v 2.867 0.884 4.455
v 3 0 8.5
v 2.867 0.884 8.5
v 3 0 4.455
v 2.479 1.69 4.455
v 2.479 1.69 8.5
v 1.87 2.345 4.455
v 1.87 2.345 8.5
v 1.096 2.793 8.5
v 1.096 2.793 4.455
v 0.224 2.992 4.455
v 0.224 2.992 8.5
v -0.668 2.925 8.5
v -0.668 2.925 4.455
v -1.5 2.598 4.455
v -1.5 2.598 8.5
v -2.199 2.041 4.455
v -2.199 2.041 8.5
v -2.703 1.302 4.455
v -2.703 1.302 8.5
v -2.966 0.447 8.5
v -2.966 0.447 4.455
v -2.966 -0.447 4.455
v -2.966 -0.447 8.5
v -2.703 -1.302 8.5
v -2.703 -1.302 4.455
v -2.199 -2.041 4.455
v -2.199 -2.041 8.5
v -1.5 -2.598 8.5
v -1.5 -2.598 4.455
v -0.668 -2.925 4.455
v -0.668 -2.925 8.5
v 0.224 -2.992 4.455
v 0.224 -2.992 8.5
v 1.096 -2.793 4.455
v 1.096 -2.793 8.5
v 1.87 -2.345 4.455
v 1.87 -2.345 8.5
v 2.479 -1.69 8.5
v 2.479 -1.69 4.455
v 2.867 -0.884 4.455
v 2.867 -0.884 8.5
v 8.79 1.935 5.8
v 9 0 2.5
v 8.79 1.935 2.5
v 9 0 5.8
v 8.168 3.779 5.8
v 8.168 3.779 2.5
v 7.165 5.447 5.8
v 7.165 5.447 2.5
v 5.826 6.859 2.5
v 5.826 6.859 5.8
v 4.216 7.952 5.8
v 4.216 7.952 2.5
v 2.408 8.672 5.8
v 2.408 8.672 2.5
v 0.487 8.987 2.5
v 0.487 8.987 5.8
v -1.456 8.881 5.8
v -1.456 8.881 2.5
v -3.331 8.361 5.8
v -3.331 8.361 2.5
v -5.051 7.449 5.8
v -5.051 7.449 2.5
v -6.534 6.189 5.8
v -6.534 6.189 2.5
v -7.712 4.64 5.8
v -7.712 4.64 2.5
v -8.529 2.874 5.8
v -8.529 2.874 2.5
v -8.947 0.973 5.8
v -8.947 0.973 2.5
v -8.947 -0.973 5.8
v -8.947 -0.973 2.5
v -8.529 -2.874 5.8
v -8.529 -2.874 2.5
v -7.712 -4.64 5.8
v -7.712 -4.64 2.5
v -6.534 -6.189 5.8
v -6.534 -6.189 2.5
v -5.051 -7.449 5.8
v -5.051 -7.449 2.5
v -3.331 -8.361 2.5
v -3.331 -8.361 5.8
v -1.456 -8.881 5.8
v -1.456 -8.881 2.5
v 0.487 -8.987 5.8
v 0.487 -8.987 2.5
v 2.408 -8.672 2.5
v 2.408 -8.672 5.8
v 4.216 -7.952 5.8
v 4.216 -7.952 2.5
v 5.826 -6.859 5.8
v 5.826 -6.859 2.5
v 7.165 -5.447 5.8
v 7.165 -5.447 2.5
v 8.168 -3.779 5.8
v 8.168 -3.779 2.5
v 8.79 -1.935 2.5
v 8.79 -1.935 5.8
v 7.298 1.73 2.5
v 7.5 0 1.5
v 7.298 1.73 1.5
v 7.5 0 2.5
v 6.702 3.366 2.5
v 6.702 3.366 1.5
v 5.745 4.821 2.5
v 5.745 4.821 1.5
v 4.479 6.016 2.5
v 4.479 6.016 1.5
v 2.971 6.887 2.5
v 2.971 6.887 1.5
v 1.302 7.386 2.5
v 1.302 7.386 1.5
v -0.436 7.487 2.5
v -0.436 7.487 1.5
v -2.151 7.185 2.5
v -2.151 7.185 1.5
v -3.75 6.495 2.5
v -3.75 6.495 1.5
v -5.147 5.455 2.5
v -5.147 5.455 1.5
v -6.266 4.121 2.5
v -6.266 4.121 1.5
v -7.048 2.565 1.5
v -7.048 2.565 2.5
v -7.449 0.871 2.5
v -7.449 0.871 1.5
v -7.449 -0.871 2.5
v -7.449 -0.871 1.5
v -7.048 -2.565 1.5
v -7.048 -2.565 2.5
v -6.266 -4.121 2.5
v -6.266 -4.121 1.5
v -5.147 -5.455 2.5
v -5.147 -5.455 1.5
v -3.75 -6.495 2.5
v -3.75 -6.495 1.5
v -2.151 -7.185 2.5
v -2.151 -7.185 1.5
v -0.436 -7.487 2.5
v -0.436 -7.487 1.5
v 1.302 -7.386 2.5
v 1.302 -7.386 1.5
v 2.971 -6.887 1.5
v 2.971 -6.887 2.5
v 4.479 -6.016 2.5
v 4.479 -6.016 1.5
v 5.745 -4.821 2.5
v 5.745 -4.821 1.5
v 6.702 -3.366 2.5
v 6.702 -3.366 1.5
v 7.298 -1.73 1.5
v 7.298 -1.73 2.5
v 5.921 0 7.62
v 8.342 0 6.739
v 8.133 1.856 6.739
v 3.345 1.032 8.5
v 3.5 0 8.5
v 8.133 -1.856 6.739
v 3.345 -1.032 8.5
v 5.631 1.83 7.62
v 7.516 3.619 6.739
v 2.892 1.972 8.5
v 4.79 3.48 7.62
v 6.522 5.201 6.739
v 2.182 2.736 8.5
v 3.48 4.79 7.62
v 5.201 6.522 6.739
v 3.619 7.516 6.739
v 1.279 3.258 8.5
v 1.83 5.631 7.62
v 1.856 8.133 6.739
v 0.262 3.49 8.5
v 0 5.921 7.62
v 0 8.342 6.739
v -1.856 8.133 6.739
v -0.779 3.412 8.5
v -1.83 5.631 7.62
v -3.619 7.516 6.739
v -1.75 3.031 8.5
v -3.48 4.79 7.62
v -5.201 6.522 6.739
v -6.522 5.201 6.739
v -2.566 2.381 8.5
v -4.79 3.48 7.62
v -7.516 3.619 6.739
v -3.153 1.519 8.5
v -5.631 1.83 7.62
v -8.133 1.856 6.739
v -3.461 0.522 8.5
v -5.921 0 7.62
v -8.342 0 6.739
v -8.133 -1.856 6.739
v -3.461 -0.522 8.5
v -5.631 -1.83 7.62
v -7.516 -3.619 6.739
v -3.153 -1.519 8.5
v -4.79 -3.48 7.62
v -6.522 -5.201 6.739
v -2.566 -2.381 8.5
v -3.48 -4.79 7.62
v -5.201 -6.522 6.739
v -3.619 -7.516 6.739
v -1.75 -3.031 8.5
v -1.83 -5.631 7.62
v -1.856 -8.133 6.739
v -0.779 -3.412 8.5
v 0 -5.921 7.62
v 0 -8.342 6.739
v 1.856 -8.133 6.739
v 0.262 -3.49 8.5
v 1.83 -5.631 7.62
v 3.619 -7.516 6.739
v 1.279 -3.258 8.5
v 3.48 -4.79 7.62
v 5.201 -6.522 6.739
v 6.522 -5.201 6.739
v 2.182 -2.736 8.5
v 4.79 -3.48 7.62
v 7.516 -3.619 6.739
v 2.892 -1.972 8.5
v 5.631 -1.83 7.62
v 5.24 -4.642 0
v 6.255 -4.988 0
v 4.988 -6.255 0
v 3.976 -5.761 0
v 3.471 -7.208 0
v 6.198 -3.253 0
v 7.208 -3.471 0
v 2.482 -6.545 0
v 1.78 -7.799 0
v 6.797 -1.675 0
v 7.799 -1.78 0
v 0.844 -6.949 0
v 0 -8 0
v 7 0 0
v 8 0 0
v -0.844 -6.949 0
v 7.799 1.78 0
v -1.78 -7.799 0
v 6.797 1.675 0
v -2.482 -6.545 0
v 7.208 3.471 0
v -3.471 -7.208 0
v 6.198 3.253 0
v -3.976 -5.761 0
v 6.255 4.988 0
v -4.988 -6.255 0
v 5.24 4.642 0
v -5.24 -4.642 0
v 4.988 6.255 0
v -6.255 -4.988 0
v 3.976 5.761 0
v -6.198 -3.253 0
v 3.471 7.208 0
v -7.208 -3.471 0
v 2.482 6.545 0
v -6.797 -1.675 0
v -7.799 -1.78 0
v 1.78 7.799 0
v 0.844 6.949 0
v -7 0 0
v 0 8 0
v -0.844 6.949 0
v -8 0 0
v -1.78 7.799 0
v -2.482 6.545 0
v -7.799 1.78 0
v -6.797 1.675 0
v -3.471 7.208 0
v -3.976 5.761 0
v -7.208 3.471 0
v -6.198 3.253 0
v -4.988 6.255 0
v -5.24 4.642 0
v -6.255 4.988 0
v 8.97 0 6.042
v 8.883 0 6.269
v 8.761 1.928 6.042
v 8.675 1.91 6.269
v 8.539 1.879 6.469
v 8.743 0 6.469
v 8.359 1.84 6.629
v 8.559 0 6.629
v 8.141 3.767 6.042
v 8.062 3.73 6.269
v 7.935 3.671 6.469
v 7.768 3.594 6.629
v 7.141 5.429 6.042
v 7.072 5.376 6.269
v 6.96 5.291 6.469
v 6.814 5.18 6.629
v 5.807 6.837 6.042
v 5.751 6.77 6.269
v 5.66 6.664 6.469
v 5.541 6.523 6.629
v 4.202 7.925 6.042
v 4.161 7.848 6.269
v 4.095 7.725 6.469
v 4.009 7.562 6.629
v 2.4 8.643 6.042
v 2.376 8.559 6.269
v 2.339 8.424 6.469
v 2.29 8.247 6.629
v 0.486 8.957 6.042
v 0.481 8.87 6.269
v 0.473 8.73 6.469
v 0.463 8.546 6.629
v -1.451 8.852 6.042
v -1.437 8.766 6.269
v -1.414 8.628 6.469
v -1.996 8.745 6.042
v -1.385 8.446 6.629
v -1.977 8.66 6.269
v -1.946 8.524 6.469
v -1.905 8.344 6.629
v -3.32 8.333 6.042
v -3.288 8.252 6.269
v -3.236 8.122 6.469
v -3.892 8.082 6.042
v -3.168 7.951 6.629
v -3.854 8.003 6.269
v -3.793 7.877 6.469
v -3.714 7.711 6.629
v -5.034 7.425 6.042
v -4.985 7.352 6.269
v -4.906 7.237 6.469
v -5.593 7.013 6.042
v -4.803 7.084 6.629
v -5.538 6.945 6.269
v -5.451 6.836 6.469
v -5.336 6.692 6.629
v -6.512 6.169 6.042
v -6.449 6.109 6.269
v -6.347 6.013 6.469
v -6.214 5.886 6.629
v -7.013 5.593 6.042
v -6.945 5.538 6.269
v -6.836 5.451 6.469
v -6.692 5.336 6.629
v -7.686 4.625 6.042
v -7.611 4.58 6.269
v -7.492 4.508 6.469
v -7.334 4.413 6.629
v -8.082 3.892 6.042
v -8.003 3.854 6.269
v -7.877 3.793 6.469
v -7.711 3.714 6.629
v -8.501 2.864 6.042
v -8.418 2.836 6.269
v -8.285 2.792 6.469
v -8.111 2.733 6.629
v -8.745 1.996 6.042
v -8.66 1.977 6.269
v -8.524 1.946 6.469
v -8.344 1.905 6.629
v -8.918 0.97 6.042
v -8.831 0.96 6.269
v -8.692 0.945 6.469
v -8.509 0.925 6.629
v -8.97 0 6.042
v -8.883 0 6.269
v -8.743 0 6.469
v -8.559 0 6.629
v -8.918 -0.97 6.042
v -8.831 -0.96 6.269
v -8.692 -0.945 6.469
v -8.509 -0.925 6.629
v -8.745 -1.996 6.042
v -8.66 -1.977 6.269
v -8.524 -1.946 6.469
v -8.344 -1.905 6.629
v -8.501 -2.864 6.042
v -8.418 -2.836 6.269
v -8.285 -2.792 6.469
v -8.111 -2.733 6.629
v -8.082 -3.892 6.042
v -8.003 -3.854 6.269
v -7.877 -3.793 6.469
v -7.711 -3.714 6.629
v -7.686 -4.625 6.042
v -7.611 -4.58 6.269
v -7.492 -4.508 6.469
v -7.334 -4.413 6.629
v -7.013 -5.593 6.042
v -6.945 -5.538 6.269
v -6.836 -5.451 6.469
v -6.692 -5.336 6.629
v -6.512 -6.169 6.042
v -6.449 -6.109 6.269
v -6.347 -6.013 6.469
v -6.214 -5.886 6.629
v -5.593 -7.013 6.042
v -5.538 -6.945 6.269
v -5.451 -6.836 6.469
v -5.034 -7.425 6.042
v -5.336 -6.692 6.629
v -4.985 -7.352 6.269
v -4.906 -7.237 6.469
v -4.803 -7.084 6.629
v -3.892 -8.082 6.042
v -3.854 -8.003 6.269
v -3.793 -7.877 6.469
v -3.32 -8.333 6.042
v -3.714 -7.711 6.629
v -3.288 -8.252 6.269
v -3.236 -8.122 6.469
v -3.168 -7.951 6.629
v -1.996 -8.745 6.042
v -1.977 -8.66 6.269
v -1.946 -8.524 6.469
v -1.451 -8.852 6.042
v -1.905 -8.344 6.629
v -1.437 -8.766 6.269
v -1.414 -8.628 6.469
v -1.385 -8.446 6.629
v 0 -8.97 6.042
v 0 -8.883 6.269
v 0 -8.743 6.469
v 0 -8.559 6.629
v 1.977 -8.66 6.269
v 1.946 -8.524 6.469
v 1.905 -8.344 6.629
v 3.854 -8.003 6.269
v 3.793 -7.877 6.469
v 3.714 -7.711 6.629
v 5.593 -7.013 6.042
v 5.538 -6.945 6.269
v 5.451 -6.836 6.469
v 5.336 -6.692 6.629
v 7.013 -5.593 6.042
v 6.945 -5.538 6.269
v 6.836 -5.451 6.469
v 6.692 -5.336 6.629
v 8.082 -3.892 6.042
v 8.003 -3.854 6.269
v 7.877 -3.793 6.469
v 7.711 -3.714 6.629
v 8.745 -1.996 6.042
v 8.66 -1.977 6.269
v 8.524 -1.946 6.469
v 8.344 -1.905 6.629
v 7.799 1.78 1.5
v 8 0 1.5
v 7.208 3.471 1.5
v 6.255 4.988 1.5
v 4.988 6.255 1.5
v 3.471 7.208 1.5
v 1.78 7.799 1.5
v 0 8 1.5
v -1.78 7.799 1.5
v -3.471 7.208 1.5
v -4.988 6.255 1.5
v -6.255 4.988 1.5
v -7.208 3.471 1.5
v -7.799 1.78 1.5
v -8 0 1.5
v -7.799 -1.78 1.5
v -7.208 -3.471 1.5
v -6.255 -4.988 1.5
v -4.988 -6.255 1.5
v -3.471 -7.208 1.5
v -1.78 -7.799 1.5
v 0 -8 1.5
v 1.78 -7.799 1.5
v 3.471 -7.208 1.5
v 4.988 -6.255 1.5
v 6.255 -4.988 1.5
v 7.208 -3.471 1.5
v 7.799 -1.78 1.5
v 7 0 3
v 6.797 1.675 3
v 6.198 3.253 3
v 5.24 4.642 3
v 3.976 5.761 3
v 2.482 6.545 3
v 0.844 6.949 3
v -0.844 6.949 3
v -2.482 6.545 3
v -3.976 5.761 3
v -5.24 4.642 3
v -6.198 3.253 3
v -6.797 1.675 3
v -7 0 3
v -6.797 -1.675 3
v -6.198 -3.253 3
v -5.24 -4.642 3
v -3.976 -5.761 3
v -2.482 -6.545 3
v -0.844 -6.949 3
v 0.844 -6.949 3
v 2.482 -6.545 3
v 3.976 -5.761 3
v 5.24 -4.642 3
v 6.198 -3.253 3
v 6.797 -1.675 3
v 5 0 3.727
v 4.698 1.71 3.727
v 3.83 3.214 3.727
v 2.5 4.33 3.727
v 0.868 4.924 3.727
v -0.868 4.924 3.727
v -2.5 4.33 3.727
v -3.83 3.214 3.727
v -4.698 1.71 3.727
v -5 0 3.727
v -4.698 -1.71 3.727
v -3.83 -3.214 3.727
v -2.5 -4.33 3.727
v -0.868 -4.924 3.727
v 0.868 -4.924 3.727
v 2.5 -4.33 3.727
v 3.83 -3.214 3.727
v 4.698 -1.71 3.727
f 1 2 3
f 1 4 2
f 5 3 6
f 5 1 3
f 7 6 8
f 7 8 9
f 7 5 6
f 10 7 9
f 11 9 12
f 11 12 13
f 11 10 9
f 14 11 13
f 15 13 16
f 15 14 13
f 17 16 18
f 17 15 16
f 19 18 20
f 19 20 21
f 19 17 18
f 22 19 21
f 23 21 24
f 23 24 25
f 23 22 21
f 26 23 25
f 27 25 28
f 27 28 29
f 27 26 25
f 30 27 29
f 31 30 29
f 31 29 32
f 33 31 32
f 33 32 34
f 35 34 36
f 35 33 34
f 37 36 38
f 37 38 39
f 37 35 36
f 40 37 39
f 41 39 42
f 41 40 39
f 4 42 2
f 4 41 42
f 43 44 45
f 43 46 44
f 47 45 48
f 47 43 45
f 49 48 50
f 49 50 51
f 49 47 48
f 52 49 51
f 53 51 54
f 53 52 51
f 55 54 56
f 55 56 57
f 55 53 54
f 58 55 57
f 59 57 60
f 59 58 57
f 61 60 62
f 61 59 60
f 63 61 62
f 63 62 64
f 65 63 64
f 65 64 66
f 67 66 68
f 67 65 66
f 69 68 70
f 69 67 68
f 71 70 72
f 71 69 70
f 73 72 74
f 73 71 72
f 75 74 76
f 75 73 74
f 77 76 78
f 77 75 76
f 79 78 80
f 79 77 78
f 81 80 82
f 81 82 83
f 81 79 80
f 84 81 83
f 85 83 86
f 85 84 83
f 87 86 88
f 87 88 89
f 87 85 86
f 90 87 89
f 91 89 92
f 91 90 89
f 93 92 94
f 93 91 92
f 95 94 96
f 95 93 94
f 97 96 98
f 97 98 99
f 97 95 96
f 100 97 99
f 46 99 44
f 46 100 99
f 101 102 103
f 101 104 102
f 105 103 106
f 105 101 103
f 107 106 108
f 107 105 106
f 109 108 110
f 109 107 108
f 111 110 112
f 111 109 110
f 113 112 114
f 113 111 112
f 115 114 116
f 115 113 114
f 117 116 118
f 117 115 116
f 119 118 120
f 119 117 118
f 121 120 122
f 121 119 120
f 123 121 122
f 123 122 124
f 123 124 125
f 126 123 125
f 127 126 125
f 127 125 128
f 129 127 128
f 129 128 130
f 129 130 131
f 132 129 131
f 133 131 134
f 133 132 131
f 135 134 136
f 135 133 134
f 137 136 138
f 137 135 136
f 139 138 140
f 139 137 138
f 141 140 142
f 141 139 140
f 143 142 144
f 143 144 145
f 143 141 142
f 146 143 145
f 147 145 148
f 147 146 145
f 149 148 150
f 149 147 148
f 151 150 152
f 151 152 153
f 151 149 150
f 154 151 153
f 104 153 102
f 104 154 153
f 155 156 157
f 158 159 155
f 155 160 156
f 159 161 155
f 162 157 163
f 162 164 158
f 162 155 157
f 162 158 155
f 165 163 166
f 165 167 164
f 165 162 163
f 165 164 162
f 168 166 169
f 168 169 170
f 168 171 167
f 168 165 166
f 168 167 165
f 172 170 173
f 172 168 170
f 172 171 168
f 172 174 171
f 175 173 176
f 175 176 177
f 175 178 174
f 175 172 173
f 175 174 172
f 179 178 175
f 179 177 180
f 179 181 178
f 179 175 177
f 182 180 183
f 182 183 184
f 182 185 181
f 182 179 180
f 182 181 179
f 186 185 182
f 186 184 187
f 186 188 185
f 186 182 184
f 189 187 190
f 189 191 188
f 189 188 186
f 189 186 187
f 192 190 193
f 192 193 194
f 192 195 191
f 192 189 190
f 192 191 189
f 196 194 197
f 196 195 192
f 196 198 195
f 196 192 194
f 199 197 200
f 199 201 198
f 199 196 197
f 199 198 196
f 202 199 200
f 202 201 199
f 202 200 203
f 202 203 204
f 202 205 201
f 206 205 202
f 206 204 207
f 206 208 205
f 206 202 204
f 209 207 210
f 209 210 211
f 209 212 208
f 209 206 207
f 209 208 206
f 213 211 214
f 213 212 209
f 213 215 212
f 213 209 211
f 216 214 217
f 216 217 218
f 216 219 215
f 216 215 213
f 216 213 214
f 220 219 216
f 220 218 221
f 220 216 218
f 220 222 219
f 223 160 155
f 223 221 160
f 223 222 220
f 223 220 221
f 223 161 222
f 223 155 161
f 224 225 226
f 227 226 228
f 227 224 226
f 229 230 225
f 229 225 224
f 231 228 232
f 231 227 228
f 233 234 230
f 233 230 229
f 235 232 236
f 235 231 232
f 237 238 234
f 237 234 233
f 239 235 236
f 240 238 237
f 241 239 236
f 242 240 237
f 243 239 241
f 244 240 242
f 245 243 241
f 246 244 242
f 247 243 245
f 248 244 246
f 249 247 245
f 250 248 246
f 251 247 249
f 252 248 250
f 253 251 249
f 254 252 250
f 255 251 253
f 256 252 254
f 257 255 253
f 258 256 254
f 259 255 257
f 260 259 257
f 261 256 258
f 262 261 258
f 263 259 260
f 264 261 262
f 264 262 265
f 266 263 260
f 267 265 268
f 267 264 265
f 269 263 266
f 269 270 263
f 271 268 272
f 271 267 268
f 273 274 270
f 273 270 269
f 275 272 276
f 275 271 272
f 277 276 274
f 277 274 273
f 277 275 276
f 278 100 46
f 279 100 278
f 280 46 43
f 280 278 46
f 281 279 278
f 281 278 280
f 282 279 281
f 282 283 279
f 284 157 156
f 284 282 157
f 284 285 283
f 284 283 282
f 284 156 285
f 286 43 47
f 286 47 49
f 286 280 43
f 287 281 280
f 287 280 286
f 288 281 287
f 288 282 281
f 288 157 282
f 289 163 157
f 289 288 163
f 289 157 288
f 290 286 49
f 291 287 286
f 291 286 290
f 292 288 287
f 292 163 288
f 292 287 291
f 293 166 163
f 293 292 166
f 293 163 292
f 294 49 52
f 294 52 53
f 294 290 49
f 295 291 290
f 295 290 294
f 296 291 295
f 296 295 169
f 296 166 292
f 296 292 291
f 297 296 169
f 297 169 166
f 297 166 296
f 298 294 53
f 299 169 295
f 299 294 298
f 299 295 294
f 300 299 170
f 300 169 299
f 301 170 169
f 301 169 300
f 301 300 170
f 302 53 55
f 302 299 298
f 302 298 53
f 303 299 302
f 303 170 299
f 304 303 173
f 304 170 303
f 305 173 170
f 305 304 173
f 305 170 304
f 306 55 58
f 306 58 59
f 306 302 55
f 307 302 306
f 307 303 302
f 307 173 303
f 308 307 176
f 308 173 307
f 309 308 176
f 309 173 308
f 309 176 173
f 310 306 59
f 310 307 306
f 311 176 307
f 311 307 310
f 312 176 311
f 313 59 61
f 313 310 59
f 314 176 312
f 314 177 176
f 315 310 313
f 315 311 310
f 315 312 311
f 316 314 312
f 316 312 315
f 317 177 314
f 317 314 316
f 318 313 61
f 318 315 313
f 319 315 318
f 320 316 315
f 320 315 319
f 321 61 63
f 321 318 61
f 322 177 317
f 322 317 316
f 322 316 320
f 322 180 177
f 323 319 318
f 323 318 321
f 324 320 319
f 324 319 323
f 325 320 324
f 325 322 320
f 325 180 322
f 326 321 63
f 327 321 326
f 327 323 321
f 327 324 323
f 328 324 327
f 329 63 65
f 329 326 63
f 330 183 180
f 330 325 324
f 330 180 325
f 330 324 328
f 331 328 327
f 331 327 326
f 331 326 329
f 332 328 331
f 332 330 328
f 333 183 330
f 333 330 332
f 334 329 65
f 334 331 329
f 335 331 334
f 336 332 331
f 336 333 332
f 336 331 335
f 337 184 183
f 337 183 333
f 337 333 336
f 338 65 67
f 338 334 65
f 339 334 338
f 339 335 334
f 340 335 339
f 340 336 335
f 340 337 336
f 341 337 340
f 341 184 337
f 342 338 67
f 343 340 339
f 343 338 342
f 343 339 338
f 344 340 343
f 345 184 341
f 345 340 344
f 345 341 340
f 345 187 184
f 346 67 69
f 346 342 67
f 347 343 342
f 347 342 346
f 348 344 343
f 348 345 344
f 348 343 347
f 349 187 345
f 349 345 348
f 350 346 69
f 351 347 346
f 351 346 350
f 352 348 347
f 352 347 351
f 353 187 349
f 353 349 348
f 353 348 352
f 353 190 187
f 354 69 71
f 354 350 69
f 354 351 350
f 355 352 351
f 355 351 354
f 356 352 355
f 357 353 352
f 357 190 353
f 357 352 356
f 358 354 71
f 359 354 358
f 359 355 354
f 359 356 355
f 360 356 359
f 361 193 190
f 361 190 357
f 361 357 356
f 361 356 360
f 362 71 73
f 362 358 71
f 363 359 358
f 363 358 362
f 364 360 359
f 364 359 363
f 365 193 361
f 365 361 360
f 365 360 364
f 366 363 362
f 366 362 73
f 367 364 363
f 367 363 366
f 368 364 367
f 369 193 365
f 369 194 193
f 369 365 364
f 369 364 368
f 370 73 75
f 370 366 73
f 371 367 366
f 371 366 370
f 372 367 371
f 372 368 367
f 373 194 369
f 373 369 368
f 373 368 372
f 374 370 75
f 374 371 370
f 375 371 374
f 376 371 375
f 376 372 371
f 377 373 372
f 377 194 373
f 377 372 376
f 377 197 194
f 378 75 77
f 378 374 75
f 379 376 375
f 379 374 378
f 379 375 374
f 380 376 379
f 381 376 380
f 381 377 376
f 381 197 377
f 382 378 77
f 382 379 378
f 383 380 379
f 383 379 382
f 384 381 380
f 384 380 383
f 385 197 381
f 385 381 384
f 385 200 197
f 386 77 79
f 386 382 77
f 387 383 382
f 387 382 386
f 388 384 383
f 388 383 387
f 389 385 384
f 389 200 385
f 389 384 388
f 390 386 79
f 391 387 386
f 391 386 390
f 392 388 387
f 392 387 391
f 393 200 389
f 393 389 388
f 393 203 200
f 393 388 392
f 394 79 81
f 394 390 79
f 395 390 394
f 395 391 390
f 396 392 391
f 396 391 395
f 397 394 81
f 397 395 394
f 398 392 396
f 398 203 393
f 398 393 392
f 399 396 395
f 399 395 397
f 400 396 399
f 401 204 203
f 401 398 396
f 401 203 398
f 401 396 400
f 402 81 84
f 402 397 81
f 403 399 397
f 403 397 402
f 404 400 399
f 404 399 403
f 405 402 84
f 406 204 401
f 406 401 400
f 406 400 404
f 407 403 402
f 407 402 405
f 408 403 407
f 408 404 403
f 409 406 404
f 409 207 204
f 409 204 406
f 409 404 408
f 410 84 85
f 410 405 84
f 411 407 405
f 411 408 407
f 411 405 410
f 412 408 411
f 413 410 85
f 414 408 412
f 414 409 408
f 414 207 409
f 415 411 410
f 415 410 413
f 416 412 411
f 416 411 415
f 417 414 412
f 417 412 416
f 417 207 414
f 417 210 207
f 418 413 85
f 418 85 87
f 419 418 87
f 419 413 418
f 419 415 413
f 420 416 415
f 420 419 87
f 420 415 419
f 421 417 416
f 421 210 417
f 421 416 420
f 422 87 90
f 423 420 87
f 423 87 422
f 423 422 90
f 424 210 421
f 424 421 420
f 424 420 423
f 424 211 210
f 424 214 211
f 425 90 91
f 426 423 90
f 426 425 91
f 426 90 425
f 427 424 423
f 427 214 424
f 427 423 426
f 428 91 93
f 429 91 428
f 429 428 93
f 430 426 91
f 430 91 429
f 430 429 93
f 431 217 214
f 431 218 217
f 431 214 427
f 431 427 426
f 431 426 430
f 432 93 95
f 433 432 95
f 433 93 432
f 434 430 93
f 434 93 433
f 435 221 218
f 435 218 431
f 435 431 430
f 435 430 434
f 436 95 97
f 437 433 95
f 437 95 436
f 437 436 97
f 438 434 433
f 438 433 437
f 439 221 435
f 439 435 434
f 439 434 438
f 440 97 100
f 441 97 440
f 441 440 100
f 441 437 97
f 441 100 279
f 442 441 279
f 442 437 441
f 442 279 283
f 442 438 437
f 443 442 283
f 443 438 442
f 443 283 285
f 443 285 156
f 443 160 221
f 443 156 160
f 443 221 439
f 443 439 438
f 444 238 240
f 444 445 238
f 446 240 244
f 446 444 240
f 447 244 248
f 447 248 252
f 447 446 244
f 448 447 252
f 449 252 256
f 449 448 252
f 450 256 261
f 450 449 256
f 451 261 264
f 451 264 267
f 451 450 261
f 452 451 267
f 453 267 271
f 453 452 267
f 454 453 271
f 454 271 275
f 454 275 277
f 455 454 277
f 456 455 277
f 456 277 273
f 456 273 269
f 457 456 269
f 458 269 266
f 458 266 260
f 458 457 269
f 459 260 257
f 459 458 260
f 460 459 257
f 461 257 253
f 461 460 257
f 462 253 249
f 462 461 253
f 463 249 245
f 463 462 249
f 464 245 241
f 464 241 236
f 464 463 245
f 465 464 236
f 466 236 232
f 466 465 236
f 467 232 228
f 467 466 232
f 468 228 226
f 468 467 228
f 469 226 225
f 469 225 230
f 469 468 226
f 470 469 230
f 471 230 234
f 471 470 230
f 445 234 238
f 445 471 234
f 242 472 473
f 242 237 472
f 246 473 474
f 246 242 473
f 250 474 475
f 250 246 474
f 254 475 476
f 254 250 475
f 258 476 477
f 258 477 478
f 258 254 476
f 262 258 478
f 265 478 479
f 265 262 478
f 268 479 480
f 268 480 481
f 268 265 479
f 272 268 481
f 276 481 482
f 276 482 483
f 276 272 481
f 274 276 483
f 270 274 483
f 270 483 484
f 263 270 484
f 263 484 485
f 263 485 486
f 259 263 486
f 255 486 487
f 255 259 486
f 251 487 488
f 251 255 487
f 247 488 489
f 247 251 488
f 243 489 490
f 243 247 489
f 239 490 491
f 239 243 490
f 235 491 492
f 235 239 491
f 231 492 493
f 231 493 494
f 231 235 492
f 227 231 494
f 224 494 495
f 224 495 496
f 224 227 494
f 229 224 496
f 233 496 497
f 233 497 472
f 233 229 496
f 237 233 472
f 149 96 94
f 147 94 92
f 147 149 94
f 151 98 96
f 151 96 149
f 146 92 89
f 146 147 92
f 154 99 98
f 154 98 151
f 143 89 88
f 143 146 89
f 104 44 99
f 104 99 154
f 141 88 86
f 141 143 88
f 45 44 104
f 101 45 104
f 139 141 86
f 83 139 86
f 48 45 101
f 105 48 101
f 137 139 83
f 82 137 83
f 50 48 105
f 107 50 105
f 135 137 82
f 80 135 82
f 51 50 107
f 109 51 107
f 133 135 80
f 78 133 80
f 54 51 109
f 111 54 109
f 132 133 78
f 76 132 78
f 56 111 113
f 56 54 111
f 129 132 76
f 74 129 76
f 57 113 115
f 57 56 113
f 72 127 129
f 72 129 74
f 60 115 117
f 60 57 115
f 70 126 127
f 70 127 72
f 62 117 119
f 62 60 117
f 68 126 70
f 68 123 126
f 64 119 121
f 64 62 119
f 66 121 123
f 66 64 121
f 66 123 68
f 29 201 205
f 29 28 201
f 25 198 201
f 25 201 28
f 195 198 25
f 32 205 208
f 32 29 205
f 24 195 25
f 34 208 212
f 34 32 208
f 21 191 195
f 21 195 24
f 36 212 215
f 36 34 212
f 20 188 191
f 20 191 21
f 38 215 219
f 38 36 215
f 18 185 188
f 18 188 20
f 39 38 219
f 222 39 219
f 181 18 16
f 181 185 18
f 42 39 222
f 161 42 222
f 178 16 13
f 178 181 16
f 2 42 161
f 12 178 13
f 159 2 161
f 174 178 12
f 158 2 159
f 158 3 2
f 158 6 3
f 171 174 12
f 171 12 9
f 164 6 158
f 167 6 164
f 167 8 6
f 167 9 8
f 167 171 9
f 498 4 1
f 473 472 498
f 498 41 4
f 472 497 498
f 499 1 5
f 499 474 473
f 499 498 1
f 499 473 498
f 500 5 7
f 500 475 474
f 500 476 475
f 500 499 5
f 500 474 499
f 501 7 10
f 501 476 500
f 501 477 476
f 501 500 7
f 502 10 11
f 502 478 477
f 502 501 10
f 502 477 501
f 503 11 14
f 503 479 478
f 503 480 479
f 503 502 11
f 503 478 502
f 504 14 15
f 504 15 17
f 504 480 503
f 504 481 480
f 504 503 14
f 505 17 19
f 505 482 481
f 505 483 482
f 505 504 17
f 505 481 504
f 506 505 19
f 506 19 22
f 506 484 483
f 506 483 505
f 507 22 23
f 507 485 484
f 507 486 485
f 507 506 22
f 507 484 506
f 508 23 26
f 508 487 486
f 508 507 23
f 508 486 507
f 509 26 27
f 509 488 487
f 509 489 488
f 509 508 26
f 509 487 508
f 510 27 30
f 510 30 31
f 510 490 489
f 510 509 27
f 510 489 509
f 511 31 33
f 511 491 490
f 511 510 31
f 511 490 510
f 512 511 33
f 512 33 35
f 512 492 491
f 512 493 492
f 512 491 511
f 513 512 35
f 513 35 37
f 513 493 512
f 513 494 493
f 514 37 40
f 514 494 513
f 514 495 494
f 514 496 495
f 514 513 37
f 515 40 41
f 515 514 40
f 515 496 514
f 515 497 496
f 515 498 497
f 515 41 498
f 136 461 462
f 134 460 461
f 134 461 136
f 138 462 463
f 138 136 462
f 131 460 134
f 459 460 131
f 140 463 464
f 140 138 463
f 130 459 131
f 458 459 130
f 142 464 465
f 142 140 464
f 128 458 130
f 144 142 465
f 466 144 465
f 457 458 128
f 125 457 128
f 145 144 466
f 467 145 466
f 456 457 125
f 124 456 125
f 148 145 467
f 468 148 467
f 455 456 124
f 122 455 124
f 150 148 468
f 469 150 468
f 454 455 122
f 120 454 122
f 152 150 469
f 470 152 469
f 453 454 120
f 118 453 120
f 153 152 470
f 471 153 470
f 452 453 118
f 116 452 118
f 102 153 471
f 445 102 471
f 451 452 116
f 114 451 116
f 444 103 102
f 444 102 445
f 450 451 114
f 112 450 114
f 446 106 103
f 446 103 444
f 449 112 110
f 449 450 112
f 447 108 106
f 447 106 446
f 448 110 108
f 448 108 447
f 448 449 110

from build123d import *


with BuildPart() as f1:
    # F0 (on Front) → F1 (revolve)
    with BuildSketch(Plane.XZ):
        with BuildLine():
            Line((3.5, 8.5), (3, 8.5))
            Line((3, 8.5), (3, 4.454545))
            Line((3, 4.454545), (7, 3))
            Line((7, 3), (7, 0))
            Line((7, 0), (8, 0))
            Line((8, 0), (8, 1.5))
            Line((8, 1.5), (7.5, 1.5))
            Line((7.5, 1.5), (7.5, 2.5))
            Line((7.5, 2.5), (9, 2.5))
            Line((9, 2.5), (9, 5.799573))
            ThreePointArc((9, 5.799573), (8.819067, 6.37327), (8.341743, 6.739366))
            Line((8.341743, 6.739366), (3.5, 8.5))
        make_face()
    revolve(axis=Axis((0, 0, 4.25), (0, 0, 1)))


solid = f1.part
